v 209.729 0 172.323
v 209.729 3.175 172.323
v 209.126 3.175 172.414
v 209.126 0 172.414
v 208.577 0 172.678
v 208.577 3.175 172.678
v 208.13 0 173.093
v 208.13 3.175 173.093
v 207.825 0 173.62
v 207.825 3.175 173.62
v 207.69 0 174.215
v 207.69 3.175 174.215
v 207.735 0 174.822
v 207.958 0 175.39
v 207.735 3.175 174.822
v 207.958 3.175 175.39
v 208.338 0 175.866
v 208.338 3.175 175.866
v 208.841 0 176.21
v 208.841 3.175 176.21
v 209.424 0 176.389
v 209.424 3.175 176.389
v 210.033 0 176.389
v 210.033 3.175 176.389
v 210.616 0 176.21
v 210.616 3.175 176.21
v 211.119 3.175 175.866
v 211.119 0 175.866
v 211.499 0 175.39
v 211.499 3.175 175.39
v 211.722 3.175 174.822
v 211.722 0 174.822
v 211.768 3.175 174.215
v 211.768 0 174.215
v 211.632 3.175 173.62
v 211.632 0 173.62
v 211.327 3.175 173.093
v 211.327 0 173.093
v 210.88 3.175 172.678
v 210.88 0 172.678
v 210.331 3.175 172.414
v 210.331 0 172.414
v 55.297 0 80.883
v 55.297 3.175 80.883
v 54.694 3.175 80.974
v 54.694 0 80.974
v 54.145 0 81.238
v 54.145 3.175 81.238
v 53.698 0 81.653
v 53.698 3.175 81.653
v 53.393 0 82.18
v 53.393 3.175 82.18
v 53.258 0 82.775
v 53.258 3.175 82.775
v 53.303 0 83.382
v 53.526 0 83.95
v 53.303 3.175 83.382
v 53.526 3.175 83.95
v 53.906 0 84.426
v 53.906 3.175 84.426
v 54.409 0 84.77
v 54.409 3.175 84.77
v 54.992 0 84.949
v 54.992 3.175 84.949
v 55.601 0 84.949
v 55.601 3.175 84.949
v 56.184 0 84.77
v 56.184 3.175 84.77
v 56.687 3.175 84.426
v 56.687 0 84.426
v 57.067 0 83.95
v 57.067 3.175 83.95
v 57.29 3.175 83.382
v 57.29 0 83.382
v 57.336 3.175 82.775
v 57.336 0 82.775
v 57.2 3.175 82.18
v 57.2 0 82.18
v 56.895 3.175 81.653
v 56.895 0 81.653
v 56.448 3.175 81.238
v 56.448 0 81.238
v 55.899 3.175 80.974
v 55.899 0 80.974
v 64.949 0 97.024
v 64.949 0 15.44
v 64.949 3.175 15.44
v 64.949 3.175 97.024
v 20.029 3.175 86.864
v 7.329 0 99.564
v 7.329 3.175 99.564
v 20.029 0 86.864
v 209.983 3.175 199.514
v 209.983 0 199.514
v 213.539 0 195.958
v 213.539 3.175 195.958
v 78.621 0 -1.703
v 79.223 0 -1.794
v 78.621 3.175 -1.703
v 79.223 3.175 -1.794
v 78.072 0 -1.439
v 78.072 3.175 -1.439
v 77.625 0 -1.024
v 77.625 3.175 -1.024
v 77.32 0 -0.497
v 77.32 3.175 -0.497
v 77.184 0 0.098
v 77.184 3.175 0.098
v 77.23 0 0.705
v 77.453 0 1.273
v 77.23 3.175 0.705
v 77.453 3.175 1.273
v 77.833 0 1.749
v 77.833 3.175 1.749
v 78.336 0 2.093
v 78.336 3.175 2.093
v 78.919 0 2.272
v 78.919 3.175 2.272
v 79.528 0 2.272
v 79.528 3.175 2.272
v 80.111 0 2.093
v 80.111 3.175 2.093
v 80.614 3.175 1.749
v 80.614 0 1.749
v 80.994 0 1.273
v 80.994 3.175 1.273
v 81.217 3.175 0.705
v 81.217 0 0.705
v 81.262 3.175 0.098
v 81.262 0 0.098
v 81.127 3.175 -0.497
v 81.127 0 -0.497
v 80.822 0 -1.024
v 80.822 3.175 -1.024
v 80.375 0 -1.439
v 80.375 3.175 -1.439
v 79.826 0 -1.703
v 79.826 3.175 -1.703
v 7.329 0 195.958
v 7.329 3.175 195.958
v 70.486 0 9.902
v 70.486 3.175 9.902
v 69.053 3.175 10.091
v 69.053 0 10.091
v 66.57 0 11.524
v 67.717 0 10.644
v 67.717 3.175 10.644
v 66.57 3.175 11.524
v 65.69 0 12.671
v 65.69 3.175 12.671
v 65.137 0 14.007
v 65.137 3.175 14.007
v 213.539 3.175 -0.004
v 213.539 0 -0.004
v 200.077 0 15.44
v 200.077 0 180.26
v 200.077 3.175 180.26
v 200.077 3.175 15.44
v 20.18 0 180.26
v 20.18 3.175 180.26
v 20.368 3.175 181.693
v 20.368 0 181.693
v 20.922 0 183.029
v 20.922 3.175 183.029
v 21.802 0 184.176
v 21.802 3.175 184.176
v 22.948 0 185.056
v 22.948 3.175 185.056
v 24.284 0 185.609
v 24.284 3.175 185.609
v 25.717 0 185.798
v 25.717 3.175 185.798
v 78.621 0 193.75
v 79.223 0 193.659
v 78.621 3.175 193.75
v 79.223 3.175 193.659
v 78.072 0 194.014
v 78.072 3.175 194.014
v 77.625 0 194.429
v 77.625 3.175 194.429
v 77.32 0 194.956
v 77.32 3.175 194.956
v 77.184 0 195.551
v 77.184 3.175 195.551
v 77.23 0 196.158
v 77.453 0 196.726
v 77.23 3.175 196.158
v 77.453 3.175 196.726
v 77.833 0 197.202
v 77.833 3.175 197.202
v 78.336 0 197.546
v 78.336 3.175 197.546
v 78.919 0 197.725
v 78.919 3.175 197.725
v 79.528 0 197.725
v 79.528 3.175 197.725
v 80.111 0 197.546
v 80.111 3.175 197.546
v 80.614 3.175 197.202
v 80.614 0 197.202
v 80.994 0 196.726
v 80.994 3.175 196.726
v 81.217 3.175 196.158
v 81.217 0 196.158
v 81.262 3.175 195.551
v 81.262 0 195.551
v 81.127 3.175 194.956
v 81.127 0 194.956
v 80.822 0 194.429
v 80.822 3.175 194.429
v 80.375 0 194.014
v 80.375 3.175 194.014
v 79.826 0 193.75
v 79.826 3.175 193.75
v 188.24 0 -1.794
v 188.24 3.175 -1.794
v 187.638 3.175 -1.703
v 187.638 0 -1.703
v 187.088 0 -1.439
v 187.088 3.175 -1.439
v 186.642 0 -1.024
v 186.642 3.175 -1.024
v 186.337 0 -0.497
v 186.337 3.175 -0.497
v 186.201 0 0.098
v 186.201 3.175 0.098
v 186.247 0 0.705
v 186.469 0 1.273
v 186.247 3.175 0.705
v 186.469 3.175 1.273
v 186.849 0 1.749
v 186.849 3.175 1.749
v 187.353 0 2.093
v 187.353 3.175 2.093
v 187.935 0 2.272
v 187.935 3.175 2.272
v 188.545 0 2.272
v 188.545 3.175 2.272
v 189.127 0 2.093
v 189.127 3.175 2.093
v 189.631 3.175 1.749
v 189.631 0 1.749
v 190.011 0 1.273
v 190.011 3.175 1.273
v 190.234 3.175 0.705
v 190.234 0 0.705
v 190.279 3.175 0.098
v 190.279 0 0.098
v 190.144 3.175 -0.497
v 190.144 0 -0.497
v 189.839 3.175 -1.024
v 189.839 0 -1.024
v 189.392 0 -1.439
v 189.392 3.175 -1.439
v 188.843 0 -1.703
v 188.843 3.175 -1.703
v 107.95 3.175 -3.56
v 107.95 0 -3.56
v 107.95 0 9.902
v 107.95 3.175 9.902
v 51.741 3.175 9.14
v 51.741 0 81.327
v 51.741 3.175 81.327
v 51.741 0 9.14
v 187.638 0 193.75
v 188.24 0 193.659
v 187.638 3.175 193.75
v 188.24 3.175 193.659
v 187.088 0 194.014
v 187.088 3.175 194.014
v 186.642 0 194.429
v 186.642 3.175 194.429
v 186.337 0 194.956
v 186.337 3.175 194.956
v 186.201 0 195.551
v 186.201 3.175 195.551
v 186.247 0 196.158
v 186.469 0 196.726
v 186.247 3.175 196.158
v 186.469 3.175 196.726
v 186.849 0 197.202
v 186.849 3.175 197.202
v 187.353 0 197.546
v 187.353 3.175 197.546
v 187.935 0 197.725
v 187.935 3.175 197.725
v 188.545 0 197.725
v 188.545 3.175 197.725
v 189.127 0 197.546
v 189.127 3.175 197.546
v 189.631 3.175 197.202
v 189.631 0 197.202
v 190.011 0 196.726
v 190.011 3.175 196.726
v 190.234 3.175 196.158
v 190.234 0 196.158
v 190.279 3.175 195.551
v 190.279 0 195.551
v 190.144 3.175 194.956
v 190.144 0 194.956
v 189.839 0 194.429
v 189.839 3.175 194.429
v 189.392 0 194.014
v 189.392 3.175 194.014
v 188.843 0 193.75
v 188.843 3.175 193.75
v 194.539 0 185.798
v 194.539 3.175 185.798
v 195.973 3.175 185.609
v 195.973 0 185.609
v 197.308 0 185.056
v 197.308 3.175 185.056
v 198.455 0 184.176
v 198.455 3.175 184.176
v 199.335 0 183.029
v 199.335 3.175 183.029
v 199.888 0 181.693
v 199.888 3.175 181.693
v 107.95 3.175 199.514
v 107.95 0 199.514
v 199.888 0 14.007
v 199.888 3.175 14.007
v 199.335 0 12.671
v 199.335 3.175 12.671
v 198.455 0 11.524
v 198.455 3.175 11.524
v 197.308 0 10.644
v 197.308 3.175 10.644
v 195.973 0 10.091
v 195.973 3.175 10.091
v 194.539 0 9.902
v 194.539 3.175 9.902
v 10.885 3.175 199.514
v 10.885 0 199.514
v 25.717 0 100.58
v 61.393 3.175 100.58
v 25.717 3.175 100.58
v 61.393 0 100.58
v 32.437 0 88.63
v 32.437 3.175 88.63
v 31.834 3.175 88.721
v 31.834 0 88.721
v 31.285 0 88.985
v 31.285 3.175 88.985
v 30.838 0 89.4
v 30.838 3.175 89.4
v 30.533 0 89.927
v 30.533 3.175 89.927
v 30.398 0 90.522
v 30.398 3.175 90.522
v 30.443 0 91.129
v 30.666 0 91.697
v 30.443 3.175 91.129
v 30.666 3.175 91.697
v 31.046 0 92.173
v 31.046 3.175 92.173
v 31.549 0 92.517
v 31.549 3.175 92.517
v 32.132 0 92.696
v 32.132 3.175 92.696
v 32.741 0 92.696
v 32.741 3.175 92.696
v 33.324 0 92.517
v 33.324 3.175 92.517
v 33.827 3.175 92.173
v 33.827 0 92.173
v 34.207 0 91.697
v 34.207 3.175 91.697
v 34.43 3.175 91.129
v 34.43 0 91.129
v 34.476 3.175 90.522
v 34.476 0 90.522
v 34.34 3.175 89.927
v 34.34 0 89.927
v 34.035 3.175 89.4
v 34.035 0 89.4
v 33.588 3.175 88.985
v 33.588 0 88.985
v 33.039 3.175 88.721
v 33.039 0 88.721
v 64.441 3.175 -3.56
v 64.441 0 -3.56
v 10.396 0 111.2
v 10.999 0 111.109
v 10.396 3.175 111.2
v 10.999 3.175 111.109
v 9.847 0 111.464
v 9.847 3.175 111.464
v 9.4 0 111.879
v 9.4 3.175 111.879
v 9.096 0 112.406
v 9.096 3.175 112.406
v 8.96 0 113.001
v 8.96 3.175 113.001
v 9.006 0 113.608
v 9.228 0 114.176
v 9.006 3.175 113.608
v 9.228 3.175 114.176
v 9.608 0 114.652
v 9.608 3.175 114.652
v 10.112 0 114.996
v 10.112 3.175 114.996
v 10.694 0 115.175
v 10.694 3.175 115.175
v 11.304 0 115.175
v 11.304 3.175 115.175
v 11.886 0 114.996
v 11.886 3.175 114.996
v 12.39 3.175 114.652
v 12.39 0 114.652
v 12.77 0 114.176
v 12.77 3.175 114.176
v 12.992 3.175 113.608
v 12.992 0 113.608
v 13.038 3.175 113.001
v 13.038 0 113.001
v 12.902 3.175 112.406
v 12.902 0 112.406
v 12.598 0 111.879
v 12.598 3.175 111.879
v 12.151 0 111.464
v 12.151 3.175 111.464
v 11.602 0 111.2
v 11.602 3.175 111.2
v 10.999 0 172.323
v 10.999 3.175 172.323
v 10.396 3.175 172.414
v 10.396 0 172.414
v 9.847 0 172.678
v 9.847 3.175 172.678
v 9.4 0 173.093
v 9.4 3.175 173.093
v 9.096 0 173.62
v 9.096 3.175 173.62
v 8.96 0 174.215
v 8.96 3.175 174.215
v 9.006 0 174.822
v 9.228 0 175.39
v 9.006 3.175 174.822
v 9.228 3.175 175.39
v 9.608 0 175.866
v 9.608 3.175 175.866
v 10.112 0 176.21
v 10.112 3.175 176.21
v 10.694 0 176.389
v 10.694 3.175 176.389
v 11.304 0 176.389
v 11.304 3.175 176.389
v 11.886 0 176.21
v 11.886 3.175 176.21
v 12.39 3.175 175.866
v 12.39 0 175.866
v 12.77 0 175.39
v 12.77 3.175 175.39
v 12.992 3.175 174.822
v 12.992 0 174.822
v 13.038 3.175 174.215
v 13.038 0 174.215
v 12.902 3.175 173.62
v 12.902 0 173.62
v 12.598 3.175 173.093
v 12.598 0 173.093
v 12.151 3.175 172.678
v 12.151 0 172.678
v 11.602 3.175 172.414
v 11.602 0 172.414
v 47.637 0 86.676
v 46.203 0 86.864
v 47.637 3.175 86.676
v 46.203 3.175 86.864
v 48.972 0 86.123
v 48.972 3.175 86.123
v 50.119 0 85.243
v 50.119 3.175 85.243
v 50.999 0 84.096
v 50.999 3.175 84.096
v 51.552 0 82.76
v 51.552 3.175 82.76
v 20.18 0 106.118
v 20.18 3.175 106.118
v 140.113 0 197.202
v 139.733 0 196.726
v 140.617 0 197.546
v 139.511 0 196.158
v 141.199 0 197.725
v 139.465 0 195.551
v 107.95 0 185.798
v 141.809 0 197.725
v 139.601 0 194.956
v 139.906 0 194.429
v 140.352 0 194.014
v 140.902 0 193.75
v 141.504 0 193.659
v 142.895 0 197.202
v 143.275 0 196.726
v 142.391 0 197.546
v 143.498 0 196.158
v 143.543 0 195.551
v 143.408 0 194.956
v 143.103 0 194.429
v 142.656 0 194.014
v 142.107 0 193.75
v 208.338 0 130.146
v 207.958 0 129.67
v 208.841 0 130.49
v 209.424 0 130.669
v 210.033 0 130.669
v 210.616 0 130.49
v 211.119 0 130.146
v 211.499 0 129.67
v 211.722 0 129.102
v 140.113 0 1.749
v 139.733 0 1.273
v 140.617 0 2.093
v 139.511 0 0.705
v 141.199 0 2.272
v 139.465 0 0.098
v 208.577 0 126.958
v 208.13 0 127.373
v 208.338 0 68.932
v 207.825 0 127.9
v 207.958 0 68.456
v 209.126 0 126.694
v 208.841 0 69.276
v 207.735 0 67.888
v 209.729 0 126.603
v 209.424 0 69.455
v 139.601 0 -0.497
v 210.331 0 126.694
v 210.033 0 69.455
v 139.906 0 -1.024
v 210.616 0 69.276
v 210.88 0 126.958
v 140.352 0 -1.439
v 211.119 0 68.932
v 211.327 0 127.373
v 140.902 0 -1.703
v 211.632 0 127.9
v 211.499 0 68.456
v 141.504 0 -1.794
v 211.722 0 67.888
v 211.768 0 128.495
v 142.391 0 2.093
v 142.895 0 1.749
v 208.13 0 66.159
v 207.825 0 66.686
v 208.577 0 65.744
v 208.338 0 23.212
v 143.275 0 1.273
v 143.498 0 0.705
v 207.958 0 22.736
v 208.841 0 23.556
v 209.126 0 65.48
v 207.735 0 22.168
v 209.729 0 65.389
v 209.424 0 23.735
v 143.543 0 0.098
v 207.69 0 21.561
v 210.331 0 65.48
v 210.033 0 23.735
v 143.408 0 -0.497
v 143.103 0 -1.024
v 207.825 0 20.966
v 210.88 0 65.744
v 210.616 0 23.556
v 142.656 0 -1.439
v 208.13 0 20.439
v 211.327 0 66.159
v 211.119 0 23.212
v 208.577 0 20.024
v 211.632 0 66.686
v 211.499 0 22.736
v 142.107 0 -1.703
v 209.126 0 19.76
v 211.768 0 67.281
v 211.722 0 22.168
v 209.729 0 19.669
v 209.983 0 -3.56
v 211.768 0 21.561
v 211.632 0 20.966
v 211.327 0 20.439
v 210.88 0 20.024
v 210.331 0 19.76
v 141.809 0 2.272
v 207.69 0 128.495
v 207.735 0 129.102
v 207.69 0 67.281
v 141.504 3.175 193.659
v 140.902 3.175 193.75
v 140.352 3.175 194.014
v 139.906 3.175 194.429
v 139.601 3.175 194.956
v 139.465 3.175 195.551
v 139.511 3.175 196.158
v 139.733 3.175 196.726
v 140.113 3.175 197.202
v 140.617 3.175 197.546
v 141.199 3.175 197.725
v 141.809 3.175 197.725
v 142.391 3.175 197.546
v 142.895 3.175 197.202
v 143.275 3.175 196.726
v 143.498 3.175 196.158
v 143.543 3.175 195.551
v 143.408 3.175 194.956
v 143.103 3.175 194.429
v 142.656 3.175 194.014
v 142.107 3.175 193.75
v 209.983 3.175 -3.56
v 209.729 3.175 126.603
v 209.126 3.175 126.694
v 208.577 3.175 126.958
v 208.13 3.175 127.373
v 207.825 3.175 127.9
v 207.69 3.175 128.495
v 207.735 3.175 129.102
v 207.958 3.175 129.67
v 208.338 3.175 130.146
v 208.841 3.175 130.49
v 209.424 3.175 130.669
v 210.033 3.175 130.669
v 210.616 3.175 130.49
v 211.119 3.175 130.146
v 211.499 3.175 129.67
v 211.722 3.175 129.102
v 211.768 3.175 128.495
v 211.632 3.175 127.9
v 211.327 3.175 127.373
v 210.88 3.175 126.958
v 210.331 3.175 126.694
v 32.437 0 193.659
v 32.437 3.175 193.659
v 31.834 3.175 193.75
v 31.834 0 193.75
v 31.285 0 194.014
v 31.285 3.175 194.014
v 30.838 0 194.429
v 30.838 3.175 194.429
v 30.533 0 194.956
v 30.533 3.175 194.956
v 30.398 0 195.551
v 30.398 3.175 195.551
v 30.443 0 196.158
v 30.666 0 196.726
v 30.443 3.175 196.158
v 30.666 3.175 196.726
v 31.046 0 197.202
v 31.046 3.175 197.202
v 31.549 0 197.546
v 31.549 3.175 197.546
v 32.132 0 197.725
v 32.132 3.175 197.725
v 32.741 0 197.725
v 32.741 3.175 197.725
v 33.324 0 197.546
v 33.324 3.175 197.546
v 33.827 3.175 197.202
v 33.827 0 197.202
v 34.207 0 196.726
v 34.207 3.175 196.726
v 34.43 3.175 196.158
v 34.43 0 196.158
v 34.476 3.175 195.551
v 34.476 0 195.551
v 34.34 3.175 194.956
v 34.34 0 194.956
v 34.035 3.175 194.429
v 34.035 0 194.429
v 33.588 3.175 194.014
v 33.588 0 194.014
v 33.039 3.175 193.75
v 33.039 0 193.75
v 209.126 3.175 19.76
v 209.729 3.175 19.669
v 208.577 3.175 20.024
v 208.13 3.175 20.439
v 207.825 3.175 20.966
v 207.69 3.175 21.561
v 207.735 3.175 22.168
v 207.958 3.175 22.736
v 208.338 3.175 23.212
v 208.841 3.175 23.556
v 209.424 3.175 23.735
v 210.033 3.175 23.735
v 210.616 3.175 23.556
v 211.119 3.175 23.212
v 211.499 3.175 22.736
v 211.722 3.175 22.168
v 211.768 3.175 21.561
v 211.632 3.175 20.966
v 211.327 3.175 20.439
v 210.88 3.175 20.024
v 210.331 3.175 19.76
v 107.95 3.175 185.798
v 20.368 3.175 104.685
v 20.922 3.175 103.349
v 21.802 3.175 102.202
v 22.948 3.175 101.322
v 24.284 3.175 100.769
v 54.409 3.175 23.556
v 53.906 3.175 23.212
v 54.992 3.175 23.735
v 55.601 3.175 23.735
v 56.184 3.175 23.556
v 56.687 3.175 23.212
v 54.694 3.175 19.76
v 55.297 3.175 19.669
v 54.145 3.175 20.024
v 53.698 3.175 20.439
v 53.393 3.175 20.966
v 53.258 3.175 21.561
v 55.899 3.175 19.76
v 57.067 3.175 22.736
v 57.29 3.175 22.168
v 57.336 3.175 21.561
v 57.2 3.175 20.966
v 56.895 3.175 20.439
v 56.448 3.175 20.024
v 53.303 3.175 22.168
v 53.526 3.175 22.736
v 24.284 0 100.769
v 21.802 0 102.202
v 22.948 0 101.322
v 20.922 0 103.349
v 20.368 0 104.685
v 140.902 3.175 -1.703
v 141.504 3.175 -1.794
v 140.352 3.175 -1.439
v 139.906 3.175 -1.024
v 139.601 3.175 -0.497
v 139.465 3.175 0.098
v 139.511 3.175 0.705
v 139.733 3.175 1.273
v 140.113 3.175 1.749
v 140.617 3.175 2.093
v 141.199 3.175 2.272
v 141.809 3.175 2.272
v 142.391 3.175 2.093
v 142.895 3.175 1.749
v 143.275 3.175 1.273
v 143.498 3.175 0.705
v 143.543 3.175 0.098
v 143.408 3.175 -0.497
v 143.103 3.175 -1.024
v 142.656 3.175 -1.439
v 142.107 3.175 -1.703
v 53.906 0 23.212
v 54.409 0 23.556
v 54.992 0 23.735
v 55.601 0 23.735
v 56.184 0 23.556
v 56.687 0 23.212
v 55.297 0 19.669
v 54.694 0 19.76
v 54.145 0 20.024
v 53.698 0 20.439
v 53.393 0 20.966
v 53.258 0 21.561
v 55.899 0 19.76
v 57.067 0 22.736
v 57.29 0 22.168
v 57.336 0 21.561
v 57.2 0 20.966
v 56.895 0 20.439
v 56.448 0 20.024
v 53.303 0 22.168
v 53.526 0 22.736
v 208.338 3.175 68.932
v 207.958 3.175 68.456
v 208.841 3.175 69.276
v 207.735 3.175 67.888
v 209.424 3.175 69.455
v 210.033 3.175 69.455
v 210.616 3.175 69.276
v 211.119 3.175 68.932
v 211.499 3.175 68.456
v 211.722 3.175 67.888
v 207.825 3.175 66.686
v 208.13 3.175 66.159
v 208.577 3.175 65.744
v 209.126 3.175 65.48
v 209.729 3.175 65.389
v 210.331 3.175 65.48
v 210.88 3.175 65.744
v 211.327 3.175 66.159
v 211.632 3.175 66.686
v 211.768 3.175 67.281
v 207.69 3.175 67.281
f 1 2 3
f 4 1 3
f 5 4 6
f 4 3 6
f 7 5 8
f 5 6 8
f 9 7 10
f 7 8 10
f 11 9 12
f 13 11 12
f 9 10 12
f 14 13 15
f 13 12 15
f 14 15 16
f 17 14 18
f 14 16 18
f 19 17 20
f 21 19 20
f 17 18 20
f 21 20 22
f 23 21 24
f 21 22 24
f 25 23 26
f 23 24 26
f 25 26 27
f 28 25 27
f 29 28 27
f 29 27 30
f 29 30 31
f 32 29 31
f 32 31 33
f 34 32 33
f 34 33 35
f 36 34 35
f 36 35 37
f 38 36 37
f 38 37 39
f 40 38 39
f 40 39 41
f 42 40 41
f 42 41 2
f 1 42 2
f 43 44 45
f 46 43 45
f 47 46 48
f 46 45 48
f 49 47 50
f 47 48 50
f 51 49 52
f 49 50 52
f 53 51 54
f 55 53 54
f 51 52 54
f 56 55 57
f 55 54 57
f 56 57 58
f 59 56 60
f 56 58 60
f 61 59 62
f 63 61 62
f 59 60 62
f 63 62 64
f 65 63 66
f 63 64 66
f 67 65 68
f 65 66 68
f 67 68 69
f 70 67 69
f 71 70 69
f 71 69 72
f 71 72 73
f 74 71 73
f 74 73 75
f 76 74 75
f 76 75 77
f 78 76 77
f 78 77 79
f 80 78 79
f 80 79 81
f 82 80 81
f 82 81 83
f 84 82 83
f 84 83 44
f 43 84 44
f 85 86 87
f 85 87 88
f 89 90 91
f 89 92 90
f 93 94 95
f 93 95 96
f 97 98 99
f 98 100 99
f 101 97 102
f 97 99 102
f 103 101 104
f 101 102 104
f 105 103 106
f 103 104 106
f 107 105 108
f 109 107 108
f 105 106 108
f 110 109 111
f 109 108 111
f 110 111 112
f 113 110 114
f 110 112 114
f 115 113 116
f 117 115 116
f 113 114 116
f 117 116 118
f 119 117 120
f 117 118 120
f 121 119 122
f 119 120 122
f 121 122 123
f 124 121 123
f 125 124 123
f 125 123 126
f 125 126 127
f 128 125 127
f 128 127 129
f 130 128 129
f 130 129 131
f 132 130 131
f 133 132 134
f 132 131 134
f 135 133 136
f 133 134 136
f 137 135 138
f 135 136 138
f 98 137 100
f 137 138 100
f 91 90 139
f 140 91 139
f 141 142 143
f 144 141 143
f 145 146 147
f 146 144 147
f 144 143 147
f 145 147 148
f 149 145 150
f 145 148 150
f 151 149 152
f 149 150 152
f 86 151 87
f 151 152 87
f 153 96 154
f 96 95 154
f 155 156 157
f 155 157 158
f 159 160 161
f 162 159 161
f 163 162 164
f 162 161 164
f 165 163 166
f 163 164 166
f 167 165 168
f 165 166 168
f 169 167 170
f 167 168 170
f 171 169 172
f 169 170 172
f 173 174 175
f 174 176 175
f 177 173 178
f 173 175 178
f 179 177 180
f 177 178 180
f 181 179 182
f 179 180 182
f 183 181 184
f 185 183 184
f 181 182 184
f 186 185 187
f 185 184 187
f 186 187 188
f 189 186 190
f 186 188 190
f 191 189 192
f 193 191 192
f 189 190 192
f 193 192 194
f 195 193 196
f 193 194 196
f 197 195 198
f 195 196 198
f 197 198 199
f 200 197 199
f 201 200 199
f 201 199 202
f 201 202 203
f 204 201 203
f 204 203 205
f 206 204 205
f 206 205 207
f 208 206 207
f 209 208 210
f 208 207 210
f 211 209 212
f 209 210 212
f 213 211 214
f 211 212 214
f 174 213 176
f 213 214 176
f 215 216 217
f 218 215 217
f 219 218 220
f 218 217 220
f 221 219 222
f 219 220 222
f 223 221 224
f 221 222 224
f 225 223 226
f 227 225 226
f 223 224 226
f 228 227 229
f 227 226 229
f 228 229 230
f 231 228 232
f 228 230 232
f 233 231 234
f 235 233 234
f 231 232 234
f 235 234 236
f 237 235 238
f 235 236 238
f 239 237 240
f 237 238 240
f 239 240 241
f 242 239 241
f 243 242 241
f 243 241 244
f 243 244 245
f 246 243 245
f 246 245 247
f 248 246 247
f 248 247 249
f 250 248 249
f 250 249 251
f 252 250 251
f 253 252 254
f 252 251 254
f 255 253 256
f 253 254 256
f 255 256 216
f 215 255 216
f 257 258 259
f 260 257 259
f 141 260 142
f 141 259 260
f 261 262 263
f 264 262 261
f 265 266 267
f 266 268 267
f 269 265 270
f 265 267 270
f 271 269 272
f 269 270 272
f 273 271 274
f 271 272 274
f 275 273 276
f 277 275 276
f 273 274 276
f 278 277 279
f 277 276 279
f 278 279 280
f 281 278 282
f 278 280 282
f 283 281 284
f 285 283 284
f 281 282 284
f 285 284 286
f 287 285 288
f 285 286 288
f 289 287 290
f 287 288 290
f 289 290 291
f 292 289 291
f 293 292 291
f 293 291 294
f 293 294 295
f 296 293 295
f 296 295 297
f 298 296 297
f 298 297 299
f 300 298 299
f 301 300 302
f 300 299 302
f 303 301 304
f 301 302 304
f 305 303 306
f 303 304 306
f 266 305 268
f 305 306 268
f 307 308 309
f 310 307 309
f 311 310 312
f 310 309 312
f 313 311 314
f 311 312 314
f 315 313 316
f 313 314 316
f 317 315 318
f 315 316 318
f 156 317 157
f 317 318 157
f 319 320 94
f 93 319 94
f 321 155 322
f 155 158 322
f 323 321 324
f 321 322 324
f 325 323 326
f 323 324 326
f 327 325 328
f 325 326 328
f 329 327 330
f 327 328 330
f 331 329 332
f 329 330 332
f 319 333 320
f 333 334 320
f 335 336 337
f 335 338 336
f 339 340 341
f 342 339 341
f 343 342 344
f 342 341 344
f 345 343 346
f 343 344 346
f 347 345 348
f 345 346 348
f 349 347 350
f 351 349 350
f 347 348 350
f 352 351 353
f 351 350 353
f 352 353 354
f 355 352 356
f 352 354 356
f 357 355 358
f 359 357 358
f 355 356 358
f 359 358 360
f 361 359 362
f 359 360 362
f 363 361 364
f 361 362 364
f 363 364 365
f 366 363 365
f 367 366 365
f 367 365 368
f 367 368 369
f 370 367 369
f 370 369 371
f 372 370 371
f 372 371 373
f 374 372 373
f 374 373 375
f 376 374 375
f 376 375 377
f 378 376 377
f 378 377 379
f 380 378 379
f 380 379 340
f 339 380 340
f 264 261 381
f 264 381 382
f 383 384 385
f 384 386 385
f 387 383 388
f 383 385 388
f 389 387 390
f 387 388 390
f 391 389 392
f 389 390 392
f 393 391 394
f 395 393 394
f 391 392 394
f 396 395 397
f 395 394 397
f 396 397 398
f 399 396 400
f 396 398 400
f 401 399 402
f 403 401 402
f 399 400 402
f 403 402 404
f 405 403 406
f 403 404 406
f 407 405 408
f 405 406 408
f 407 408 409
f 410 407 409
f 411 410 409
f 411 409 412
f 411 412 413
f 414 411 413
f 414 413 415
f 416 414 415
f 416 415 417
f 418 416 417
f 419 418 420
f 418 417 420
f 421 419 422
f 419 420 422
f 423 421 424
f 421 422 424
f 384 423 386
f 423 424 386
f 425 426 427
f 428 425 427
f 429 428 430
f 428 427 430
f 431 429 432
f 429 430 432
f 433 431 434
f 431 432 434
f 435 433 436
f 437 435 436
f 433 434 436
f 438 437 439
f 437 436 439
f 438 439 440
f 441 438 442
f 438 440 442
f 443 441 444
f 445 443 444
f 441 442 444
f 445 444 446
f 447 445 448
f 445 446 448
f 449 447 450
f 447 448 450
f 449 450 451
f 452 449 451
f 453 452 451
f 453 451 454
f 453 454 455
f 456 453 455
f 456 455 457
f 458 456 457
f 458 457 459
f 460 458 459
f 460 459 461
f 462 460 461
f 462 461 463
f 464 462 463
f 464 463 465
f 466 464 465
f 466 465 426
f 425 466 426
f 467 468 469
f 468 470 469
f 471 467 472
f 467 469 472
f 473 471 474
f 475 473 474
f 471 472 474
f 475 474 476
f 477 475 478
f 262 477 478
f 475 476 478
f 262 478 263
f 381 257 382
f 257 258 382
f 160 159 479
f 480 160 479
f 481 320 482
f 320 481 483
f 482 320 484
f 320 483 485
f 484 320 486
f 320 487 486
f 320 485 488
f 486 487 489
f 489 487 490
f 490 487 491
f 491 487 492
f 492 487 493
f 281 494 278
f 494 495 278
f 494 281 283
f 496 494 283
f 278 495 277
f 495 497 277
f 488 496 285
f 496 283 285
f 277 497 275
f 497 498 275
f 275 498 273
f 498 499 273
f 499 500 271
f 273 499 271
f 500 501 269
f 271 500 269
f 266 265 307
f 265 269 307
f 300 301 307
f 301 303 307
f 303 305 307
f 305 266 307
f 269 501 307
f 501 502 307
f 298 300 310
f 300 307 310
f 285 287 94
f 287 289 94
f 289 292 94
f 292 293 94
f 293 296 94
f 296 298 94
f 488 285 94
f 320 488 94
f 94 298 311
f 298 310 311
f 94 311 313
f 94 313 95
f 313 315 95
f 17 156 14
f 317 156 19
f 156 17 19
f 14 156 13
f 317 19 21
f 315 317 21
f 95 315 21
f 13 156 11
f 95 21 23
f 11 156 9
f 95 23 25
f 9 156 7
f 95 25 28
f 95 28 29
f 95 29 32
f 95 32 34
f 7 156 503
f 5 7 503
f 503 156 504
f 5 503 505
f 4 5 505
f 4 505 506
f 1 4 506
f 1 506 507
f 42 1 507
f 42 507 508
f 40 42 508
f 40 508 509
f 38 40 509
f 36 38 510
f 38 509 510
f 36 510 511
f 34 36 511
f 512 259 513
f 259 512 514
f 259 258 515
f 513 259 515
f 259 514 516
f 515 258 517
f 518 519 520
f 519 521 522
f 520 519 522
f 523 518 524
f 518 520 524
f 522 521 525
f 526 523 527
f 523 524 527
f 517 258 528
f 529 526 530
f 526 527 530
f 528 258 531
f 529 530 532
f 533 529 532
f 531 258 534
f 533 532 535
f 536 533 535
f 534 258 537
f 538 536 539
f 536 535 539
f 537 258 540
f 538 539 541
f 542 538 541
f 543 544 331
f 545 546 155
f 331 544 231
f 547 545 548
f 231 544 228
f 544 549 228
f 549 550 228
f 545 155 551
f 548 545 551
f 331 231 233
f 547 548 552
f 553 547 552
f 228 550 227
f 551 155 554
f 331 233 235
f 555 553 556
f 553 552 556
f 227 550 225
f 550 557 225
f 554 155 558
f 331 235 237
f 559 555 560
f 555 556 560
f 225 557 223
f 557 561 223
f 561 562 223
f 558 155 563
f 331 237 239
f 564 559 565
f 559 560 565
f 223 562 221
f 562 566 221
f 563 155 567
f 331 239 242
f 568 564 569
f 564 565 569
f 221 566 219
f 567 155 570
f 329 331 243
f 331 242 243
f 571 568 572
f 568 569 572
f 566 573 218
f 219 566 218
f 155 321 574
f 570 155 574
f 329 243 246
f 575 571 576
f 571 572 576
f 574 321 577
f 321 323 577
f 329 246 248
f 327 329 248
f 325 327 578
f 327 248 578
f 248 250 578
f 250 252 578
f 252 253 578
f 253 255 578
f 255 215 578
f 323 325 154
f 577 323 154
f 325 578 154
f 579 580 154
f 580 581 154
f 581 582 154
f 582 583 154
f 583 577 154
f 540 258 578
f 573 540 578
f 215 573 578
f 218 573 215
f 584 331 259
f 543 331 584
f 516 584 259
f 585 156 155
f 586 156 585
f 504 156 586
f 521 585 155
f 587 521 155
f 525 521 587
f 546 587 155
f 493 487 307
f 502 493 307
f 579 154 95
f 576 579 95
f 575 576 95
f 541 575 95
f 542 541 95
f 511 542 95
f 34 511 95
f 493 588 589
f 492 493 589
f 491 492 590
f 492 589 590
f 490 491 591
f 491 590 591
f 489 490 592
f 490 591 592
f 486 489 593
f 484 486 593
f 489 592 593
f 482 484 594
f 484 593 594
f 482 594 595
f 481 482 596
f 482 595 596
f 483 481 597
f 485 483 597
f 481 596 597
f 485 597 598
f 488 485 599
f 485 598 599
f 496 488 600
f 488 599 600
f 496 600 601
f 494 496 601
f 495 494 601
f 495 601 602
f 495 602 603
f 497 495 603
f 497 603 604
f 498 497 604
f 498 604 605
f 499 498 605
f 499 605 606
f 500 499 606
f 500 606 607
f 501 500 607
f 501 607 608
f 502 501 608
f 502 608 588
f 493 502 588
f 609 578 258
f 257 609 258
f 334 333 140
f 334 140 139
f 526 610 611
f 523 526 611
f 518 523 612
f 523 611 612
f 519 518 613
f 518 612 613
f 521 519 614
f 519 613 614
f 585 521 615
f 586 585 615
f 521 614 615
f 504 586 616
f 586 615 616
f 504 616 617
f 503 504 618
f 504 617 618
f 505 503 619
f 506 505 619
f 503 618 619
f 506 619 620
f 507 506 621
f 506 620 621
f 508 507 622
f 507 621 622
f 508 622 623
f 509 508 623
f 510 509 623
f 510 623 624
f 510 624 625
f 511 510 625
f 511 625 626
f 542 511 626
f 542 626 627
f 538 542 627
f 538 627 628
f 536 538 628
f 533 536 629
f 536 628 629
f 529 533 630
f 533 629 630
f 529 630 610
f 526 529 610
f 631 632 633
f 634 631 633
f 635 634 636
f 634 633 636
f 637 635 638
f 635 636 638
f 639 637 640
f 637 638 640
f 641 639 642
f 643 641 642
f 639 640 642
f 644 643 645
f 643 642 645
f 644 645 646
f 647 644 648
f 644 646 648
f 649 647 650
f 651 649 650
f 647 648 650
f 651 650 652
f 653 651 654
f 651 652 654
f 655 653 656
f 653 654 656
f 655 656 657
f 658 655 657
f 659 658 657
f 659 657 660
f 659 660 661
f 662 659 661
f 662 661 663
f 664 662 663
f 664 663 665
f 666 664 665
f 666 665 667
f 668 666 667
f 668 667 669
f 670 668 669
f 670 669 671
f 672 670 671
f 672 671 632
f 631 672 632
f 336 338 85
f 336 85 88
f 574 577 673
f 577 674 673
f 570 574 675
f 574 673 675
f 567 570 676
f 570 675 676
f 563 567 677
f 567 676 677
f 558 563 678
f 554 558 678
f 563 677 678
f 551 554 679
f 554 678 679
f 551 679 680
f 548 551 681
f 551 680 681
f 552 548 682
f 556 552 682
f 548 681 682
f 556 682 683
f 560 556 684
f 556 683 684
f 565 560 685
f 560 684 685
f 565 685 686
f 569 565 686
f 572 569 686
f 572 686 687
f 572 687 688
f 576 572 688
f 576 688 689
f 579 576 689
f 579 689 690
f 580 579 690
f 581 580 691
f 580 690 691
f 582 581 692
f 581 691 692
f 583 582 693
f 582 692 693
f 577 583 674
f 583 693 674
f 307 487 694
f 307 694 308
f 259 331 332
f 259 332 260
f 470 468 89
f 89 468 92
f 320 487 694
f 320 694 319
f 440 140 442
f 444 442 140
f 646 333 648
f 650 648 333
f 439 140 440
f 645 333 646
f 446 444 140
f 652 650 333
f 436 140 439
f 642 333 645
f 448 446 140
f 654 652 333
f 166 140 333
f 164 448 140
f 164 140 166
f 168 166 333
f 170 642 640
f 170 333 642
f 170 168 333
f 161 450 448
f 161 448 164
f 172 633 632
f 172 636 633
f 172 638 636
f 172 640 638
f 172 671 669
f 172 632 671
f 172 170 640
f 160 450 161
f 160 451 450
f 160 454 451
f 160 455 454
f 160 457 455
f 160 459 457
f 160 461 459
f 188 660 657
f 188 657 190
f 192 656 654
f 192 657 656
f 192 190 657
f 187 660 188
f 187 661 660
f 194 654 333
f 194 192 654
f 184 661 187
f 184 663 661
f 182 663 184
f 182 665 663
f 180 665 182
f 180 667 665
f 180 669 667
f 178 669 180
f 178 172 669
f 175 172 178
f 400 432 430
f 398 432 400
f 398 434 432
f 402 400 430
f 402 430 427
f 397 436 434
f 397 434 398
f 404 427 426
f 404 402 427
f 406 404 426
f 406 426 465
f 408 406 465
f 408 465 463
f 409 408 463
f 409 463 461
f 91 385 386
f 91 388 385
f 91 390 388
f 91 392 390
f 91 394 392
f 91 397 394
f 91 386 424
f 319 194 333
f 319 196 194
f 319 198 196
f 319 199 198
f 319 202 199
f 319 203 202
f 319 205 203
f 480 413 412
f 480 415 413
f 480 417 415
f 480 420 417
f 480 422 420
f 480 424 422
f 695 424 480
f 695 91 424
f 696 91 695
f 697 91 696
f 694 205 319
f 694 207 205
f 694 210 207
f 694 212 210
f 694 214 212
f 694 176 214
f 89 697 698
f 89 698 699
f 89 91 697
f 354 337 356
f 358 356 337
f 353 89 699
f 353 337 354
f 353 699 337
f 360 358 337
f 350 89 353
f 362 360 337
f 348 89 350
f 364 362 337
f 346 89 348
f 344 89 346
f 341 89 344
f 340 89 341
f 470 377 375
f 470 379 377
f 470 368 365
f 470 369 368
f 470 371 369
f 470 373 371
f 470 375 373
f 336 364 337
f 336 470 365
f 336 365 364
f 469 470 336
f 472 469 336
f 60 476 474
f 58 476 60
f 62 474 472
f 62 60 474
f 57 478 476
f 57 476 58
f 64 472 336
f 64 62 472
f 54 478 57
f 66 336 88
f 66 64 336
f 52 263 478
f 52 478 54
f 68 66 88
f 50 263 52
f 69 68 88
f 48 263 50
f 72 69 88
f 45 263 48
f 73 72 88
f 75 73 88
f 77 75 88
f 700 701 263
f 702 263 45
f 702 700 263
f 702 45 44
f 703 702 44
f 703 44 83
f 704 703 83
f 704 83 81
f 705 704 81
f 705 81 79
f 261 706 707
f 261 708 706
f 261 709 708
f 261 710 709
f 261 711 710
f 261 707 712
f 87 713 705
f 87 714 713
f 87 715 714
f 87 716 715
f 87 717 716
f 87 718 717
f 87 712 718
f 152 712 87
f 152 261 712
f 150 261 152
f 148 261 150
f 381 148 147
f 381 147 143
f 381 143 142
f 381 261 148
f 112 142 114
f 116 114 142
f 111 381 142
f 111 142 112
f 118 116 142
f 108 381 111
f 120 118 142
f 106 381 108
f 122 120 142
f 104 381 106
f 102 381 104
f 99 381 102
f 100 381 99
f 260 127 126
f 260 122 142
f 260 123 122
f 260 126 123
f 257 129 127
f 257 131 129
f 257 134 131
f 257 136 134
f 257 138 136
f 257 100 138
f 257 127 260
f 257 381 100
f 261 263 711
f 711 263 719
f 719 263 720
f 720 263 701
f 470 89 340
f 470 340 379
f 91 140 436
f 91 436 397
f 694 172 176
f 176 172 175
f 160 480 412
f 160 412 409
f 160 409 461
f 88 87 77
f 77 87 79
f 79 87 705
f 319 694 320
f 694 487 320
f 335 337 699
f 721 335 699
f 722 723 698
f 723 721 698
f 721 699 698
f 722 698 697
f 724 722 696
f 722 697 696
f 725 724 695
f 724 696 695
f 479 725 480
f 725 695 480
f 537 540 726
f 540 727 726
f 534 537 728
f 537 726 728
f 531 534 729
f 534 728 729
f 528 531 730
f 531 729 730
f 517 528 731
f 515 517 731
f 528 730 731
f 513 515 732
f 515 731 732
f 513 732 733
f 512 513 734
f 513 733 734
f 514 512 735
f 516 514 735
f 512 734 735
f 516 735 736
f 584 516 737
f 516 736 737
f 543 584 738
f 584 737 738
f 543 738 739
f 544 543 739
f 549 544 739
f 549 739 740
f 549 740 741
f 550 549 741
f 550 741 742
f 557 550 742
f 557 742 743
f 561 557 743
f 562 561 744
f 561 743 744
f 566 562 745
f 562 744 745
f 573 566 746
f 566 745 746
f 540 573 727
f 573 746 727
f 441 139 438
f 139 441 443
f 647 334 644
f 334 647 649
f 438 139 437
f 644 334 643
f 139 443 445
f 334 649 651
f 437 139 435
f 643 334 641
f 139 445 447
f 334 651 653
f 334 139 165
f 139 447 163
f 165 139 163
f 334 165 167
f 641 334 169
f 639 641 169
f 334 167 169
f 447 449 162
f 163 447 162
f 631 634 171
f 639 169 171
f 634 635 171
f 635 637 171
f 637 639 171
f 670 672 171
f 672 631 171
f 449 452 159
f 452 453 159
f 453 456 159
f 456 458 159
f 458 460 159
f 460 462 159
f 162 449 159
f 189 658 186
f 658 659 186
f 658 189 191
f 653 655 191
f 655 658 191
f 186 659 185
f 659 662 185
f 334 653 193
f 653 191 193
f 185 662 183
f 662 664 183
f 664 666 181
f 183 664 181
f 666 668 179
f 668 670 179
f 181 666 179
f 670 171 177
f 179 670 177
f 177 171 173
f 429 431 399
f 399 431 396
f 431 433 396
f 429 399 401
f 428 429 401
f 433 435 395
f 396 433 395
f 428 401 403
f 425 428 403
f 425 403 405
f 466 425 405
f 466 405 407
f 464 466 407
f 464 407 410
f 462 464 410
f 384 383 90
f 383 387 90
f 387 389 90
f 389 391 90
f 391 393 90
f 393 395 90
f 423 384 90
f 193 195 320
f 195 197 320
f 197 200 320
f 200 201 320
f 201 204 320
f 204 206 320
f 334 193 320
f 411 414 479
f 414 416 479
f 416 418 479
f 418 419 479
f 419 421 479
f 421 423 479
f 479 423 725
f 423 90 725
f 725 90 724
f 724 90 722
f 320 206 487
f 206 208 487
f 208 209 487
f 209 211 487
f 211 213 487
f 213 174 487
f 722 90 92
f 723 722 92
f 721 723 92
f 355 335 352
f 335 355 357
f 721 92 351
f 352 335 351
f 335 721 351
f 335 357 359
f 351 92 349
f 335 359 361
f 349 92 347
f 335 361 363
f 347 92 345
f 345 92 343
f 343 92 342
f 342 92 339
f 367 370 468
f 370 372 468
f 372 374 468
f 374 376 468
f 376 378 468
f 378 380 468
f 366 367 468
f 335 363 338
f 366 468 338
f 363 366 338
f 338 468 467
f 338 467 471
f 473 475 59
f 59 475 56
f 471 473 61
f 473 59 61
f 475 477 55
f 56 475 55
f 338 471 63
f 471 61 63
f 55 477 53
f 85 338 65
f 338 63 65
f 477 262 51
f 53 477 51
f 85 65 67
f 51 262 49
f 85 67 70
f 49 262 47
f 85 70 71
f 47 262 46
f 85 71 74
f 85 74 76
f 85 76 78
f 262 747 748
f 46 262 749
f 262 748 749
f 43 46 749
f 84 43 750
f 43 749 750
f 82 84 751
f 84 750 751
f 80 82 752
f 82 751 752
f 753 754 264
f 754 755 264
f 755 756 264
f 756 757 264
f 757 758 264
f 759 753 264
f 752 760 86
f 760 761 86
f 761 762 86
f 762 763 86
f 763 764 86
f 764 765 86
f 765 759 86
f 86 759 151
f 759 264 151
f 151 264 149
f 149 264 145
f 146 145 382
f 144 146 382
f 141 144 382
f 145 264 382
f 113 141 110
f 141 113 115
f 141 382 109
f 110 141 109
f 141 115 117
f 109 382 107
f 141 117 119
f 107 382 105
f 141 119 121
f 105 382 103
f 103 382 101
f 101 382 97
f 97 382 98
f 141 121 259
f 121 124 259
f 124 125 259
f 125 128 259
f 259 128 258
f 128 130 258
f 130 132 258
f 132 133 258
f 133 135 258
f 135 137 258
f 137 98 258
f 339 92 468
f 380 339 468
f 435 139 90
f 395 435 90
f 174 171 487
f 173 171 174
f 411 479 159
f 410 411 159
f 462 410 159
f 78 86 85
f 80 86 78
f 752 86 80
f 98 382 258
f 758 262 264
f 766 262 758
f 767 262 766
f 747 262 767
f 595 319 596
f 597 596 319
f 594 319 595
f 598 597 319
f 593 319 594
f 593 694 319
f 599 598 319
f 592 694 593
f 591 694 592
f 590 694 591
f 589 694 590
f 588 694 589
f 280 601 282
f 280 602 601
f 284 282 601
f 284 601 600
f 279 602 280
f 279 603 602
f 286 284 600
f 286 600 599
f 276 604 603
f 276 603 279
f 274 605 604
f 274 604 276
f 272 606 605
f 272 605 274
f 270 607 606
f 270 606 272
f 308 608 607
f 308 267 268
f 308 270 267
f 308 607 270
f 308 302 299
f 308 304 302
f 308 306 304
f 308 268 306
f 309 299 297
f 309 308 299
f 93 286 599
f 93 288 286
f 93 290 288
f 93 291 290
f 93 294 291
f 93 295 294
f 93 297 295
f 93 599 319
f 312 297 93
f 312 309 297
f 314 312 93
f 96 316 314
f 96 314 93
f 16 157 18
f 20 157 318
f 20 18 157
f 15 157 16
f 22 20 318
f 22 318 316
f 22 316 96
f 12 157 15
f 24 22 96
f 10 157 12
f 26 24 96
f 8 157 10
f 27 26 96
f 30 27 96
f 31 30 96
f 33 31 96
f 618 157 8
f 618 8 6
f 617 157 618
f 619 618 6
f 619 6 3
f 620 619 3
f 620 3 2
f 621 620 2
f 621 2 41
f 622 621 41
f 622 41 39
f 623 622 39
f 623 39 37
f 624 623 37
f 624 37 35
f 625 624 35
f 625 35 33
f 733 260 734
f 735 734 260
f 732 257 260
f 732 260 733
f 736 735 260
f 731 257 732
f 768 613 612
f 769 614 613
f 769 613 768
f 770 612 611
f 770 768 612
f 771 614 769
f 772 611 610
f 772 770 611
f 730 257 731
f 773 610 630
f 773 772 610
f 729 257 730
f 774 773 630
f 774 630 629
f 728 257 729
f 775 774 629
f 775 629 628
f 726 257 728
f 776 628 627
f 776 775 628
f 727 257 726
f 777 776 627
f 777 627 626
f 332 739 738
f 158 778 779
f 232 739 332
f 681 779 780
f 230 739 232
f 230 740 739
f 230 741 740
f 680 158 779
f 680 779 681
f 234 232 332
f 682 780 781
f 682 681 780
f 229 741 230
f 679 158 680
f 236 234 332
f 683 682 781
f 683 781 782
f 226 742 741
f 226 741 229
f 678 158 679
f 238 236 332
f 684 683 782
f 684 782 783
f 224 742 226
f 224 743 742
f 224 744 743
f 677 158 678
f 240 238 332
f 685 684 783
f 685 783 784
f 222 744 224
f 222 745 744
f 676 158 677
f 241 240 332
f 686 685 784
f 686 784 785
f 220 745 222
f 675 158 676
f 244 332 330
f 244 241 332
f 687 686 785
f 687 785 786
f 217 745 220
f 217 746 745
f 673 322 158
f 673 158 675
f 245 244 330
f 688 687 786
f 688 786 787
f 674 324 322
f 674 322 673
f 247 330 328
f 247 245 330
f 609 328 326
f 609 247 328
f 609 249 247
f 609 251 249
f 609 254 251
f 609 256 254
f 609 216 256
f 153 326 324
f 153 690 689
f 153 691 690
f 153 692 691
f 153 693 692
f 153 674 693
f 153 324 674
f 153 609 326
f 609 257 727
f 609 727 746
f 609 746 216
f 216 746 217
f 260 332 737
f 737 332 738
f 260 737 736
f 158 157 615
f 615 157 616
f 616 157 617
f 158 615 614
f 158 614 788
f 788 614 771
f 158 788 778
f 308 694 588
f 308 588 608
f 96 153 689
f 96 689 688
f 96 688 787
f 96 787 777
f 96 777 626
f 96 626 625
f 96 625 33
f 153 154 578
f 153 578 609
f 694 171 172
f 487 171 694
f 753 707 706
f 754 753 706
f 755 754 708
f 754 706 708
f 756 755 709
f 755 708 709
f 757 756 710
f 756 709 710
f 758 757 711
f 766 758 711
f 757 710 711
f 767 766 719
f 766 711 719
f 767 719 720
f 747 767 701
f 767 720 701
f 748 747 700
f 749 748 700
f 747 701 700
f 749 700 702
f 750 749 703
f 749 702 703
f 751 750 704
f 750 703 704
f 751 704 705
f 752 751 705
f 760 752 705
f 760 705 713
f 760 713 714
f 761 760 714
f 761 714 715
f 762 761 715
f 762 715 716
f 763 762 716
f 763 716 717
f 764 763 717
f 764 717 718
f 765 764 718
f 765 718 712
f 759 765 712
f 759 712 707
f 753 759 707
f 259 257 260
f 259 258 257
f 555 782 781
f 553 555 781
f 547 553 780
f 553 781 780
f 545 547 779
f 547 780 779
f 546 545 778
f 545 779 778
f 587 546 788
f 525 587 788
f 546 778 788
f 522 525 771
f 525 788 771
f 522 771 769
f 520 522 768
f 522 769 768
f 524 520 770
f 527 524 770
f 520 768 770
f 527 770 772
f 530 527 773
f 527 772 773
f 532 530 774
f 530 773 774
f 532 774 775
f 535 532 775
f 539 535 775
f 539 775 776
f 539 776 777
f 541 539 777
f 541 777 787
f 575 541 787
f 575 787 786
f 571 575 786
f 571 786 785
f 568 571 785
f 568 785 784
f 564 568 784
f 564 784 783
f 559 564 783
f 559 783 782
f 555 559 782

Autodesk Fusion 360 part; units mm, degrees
sketch "Front" plane through (0, 0, 0) normal (0, 1, 0) x (1, 0, 0) in component "1006349"
  line L0 (-57.8768, -199.5135) -> (216.2733, -199.5135) construction
  line L1 (-57.6388, 3.5595) -> (225.0785, 3.5595) construction
  line L2 (7.3291, 79.7924) -> (7.3291, -206.2565) construction
  line L3 (213.5386, 80.0304) -> (213.5386, -202.9248) construction
  line L4 (-45.264, -185.7975) -> (221.5088, -185.7975) construction
  line L5 (-43.8142, -9.9025) -> (216.9872, -9.9025) construction
  line L6 (20.1798, 68.3695) -> (20.1798, -205.3046) construction
  line L7 (-33.6031, -100.5805) -> (90.6212, -100.5805) construction
  line L8 (-21.4662, -86.8645) -> (74.9147, -86.8645) construction
  line L9 (51.7406, 52.901) -> (51.7406, -104.1642) construction
  line L10 (64.9486, 43.6199) -> (64.9486, -104.4021) construction
  line L11 (61.3164, 31.245) -> (61.3164, -104.4021) construction
  line L12 (204.2676, 28.1453) -> (204.2676, -293.7347) construction
  line L13 (301.4692, -174.3675) -> (-2.19, -174.3675) construction
  line L14 (289.3324, -128.6475) -> (193.4275, -128.6475) construction
  line L15 (188.2402, -212.6819) -> (188.2402, 15.0626) construction
  line L16 (141.5042, -224.3428) -> (141.5042, 9.827) construction
  line L17 (79.2234, -236.9556) -> (79.2234, 11.9688) construction
  line L18 (32.4366, -262.9987) -> (32.4366, -64.0809) construction
  line L19 (55.2966, -250.3288) -> (55.2966, 19.8573) construction
  line L20 (276.3559, -113.1535) -> (-0.7101, -113.1535) construction
  line L21 (251.1435, -82.9275) -> (47.1227, -82.9275) construction
  line L22 (224.557, -21.7135) -> (42.5012, -21.7135) construction
  line L23 (328.6587, -0.2505) -> (74.127, -0.2505) construction
  line L24 (326.747, -5.7115) -> (-6.8013, -5.7115) construction
  line L25 (238.6648, -67.4335) -> (193.169, -67.4335) construction
  line L26 (209.7286, -275.7982) -> (209.7286, -12.1057) construction
  line L27 (313.957, -195.7035) -> (25.5151, -195.7035) construction
  line L28 (325.8246, -190.0139) -> (-1.5489, -190.0139) construction
  line L29 (263.2084, -90.6745) -> (24.7432, -90.6745) construction
  line L30 (10.999, -276.0365) -> (10.999, -104.4195) construction
  line L31 (16.7648, -288.1351) -> (16.7648, -78.75) construction
  line L32 (7.3291, -199.5135) -> (213.5386, -199.5135)
  line L33 (213.5386, 3.5595) -> (51.7406, 3.5595)
  line L34 (51.7406, -86.8645) -> (51.7406, 3.5595)
  line L35 (51.7406, -86.8645) -> (7.3291, -86.8645)
  line L36 (7.3291, -86.8645) -> (7.3291, -199.5135)
  line L37 (213.5386, -199.5135) -> (213.5386, 3.5595)
  line L38 (20.1798, -104.5315) -> (20.1798, -100.5805)
  line L39 (200.0766, -193.5194) -> (200.0766, 68.0398) construction
  line L40 (-6.7988, -96.9737) -> (70.6703, -96.9737) construction
  line L41 (20.1798, -185.7975) -> (200.0766, -185.7975)
  line L42 (200.0766, -185.7975) -> (200.0766, -5.7115)
  line L43 (64.9486, -5.7115) -> (64.9486, -100.5805)
  line L44 (64.9486, -100.5805) -> (20.1798, -100.5805)
  line L45 (20.1798, -100.5805) -> (20.1798, -185.7975)
  line L46 (200.0766, -9.9025) -> (64.9486, -9.9025)
  point P0 (10.999, -174.3675)
  point P1 (32.4366, -195.7035)
  point P2 (79.2234, -195.7035)
  point P3 (141.5042, -195.7035)
  point P4 (188.2402, -195.7035)
  point P5 (209.7286, -174.3675)
  point P6 (209.7286, -128.6475)
  point P7 (209.7286, -67.4335)
  point P8 (209.7286, -21.7135)
  point P9 (188.2402, -0.2505)
  point P10 (141.5042, -0.2505)
  point P11 (79.2234, -0.2505)
  point P12 (55.2966, -21.7135)
  point P13 (55.2966, -82.9275)
  point P14 (32.4366, -90.6745)
  point P15 (10.999, -113.1535)
  dimension "d1" = 203.073
  dimension "d2" = 174.117
  dimension "d3" = 128.397
  dimension "d4" = 90.424
  dimension "d5" = 82.677
  dimension "d6" = 67.183
  dimension "d7" = 21.463
  dimension "d8" = 195.453
  dimension "d9" = 90.424
  dimension "d10" = 13.462
  dimension "d14" = 198.7296
  dimension "d15" = 177.292
  dimension "d16" = 154.432
  dimension "d17" = 130.5052
  dimension "d18" = 68.2244
  dimension "d19" = 21.4884
  dimension "d20" = 161.798
  dimension "d22" = 142.9512
  dimension "d26" = 175.895
  dimension "d27" = 112.903
  dimension "d28" = 184.3024
  dimension "d31" = 5.461
  dimension "d32" = 13.716
  dimension "d33" = 187.5028
  dimension "d46" = 9.652
  dimension "d48" = 13.462
  dimension "d49" = 135.128
  dimension "d50" = 91.2622
  dimension "d51" = 5.461
extrude "Extrude2" add sketch "Front" along normal blind 3.175 makes body 1 in component "1006349"
chamfer "Chamfer3" distance 3.556 angle 45 4 edges at (213.5386, 1.5875, -3.5595) (64.9486, 1.5875, 100.5805) (7.3291, 1.5875, 199.5135) (213.5386, 1.5875, 199.5135) on bodies 1 in component "1006349"
chamfer "Chamfer4" distance 12.7 angle 45 2 edges at (7.3291, 1.5875, 86.8645) (51.7406, 1.5875, -3.5595) on bodies 1 in component "1006349"
fillet "Fillet2" radius 5.5372 6 edges at (20.1798, 1.5875, 185.7975) (20.1798, 1.5875, 100.5805) (64.9486, 1.5875, 9.9025) (200.0766, 1.5875, 9.9025) (200.0766, 1.5875, 185.7975) (51.7406, 1.5875, 86.8645) on bodies 1 in component "1006349"
hole "Hole2" at (32.4366, 0, 195.7035) at (79.2234, 0, 195.7035) at (141.5042, 0, 195.7035) at (188.2402, 0, 195.7035) at (10.999, 0, 174.3675) at (10.999, 0, 113.1535) at (32.4366, 0, 90.6745) at (209.7286, 0, 174.3675) at (209.7286, 0, 128.6475) at (209.7286, 0, 67.4335) at (209.7286, 0, 21.7135) at (188.2402, 0, 0.2505) at (141.5042, 0, 0.2505) at (79.2234, 0, 0.2505) at (55.2966, 0, 21.7135) at (55.2966, 0, 82.9275) direction (0, 1, 0) diameter 4.0894 end through all bodies 1 1 in component "1006349"
ref_plane "WorkPlane1" through (107.95, 0, 0) normal (1, 0, 0) x (0, 1, 0)
split "Split1" by plane through (107.95, 0, 0) normal (1, 0, 0) bodies 1 makes body 2 at (118.478, 0, 193.4892) in component "1006349"
component "1006349" placed x (1, 0, 0) y (0, 1, 0) z (0, 0, 1) at (0, 0, 0)
